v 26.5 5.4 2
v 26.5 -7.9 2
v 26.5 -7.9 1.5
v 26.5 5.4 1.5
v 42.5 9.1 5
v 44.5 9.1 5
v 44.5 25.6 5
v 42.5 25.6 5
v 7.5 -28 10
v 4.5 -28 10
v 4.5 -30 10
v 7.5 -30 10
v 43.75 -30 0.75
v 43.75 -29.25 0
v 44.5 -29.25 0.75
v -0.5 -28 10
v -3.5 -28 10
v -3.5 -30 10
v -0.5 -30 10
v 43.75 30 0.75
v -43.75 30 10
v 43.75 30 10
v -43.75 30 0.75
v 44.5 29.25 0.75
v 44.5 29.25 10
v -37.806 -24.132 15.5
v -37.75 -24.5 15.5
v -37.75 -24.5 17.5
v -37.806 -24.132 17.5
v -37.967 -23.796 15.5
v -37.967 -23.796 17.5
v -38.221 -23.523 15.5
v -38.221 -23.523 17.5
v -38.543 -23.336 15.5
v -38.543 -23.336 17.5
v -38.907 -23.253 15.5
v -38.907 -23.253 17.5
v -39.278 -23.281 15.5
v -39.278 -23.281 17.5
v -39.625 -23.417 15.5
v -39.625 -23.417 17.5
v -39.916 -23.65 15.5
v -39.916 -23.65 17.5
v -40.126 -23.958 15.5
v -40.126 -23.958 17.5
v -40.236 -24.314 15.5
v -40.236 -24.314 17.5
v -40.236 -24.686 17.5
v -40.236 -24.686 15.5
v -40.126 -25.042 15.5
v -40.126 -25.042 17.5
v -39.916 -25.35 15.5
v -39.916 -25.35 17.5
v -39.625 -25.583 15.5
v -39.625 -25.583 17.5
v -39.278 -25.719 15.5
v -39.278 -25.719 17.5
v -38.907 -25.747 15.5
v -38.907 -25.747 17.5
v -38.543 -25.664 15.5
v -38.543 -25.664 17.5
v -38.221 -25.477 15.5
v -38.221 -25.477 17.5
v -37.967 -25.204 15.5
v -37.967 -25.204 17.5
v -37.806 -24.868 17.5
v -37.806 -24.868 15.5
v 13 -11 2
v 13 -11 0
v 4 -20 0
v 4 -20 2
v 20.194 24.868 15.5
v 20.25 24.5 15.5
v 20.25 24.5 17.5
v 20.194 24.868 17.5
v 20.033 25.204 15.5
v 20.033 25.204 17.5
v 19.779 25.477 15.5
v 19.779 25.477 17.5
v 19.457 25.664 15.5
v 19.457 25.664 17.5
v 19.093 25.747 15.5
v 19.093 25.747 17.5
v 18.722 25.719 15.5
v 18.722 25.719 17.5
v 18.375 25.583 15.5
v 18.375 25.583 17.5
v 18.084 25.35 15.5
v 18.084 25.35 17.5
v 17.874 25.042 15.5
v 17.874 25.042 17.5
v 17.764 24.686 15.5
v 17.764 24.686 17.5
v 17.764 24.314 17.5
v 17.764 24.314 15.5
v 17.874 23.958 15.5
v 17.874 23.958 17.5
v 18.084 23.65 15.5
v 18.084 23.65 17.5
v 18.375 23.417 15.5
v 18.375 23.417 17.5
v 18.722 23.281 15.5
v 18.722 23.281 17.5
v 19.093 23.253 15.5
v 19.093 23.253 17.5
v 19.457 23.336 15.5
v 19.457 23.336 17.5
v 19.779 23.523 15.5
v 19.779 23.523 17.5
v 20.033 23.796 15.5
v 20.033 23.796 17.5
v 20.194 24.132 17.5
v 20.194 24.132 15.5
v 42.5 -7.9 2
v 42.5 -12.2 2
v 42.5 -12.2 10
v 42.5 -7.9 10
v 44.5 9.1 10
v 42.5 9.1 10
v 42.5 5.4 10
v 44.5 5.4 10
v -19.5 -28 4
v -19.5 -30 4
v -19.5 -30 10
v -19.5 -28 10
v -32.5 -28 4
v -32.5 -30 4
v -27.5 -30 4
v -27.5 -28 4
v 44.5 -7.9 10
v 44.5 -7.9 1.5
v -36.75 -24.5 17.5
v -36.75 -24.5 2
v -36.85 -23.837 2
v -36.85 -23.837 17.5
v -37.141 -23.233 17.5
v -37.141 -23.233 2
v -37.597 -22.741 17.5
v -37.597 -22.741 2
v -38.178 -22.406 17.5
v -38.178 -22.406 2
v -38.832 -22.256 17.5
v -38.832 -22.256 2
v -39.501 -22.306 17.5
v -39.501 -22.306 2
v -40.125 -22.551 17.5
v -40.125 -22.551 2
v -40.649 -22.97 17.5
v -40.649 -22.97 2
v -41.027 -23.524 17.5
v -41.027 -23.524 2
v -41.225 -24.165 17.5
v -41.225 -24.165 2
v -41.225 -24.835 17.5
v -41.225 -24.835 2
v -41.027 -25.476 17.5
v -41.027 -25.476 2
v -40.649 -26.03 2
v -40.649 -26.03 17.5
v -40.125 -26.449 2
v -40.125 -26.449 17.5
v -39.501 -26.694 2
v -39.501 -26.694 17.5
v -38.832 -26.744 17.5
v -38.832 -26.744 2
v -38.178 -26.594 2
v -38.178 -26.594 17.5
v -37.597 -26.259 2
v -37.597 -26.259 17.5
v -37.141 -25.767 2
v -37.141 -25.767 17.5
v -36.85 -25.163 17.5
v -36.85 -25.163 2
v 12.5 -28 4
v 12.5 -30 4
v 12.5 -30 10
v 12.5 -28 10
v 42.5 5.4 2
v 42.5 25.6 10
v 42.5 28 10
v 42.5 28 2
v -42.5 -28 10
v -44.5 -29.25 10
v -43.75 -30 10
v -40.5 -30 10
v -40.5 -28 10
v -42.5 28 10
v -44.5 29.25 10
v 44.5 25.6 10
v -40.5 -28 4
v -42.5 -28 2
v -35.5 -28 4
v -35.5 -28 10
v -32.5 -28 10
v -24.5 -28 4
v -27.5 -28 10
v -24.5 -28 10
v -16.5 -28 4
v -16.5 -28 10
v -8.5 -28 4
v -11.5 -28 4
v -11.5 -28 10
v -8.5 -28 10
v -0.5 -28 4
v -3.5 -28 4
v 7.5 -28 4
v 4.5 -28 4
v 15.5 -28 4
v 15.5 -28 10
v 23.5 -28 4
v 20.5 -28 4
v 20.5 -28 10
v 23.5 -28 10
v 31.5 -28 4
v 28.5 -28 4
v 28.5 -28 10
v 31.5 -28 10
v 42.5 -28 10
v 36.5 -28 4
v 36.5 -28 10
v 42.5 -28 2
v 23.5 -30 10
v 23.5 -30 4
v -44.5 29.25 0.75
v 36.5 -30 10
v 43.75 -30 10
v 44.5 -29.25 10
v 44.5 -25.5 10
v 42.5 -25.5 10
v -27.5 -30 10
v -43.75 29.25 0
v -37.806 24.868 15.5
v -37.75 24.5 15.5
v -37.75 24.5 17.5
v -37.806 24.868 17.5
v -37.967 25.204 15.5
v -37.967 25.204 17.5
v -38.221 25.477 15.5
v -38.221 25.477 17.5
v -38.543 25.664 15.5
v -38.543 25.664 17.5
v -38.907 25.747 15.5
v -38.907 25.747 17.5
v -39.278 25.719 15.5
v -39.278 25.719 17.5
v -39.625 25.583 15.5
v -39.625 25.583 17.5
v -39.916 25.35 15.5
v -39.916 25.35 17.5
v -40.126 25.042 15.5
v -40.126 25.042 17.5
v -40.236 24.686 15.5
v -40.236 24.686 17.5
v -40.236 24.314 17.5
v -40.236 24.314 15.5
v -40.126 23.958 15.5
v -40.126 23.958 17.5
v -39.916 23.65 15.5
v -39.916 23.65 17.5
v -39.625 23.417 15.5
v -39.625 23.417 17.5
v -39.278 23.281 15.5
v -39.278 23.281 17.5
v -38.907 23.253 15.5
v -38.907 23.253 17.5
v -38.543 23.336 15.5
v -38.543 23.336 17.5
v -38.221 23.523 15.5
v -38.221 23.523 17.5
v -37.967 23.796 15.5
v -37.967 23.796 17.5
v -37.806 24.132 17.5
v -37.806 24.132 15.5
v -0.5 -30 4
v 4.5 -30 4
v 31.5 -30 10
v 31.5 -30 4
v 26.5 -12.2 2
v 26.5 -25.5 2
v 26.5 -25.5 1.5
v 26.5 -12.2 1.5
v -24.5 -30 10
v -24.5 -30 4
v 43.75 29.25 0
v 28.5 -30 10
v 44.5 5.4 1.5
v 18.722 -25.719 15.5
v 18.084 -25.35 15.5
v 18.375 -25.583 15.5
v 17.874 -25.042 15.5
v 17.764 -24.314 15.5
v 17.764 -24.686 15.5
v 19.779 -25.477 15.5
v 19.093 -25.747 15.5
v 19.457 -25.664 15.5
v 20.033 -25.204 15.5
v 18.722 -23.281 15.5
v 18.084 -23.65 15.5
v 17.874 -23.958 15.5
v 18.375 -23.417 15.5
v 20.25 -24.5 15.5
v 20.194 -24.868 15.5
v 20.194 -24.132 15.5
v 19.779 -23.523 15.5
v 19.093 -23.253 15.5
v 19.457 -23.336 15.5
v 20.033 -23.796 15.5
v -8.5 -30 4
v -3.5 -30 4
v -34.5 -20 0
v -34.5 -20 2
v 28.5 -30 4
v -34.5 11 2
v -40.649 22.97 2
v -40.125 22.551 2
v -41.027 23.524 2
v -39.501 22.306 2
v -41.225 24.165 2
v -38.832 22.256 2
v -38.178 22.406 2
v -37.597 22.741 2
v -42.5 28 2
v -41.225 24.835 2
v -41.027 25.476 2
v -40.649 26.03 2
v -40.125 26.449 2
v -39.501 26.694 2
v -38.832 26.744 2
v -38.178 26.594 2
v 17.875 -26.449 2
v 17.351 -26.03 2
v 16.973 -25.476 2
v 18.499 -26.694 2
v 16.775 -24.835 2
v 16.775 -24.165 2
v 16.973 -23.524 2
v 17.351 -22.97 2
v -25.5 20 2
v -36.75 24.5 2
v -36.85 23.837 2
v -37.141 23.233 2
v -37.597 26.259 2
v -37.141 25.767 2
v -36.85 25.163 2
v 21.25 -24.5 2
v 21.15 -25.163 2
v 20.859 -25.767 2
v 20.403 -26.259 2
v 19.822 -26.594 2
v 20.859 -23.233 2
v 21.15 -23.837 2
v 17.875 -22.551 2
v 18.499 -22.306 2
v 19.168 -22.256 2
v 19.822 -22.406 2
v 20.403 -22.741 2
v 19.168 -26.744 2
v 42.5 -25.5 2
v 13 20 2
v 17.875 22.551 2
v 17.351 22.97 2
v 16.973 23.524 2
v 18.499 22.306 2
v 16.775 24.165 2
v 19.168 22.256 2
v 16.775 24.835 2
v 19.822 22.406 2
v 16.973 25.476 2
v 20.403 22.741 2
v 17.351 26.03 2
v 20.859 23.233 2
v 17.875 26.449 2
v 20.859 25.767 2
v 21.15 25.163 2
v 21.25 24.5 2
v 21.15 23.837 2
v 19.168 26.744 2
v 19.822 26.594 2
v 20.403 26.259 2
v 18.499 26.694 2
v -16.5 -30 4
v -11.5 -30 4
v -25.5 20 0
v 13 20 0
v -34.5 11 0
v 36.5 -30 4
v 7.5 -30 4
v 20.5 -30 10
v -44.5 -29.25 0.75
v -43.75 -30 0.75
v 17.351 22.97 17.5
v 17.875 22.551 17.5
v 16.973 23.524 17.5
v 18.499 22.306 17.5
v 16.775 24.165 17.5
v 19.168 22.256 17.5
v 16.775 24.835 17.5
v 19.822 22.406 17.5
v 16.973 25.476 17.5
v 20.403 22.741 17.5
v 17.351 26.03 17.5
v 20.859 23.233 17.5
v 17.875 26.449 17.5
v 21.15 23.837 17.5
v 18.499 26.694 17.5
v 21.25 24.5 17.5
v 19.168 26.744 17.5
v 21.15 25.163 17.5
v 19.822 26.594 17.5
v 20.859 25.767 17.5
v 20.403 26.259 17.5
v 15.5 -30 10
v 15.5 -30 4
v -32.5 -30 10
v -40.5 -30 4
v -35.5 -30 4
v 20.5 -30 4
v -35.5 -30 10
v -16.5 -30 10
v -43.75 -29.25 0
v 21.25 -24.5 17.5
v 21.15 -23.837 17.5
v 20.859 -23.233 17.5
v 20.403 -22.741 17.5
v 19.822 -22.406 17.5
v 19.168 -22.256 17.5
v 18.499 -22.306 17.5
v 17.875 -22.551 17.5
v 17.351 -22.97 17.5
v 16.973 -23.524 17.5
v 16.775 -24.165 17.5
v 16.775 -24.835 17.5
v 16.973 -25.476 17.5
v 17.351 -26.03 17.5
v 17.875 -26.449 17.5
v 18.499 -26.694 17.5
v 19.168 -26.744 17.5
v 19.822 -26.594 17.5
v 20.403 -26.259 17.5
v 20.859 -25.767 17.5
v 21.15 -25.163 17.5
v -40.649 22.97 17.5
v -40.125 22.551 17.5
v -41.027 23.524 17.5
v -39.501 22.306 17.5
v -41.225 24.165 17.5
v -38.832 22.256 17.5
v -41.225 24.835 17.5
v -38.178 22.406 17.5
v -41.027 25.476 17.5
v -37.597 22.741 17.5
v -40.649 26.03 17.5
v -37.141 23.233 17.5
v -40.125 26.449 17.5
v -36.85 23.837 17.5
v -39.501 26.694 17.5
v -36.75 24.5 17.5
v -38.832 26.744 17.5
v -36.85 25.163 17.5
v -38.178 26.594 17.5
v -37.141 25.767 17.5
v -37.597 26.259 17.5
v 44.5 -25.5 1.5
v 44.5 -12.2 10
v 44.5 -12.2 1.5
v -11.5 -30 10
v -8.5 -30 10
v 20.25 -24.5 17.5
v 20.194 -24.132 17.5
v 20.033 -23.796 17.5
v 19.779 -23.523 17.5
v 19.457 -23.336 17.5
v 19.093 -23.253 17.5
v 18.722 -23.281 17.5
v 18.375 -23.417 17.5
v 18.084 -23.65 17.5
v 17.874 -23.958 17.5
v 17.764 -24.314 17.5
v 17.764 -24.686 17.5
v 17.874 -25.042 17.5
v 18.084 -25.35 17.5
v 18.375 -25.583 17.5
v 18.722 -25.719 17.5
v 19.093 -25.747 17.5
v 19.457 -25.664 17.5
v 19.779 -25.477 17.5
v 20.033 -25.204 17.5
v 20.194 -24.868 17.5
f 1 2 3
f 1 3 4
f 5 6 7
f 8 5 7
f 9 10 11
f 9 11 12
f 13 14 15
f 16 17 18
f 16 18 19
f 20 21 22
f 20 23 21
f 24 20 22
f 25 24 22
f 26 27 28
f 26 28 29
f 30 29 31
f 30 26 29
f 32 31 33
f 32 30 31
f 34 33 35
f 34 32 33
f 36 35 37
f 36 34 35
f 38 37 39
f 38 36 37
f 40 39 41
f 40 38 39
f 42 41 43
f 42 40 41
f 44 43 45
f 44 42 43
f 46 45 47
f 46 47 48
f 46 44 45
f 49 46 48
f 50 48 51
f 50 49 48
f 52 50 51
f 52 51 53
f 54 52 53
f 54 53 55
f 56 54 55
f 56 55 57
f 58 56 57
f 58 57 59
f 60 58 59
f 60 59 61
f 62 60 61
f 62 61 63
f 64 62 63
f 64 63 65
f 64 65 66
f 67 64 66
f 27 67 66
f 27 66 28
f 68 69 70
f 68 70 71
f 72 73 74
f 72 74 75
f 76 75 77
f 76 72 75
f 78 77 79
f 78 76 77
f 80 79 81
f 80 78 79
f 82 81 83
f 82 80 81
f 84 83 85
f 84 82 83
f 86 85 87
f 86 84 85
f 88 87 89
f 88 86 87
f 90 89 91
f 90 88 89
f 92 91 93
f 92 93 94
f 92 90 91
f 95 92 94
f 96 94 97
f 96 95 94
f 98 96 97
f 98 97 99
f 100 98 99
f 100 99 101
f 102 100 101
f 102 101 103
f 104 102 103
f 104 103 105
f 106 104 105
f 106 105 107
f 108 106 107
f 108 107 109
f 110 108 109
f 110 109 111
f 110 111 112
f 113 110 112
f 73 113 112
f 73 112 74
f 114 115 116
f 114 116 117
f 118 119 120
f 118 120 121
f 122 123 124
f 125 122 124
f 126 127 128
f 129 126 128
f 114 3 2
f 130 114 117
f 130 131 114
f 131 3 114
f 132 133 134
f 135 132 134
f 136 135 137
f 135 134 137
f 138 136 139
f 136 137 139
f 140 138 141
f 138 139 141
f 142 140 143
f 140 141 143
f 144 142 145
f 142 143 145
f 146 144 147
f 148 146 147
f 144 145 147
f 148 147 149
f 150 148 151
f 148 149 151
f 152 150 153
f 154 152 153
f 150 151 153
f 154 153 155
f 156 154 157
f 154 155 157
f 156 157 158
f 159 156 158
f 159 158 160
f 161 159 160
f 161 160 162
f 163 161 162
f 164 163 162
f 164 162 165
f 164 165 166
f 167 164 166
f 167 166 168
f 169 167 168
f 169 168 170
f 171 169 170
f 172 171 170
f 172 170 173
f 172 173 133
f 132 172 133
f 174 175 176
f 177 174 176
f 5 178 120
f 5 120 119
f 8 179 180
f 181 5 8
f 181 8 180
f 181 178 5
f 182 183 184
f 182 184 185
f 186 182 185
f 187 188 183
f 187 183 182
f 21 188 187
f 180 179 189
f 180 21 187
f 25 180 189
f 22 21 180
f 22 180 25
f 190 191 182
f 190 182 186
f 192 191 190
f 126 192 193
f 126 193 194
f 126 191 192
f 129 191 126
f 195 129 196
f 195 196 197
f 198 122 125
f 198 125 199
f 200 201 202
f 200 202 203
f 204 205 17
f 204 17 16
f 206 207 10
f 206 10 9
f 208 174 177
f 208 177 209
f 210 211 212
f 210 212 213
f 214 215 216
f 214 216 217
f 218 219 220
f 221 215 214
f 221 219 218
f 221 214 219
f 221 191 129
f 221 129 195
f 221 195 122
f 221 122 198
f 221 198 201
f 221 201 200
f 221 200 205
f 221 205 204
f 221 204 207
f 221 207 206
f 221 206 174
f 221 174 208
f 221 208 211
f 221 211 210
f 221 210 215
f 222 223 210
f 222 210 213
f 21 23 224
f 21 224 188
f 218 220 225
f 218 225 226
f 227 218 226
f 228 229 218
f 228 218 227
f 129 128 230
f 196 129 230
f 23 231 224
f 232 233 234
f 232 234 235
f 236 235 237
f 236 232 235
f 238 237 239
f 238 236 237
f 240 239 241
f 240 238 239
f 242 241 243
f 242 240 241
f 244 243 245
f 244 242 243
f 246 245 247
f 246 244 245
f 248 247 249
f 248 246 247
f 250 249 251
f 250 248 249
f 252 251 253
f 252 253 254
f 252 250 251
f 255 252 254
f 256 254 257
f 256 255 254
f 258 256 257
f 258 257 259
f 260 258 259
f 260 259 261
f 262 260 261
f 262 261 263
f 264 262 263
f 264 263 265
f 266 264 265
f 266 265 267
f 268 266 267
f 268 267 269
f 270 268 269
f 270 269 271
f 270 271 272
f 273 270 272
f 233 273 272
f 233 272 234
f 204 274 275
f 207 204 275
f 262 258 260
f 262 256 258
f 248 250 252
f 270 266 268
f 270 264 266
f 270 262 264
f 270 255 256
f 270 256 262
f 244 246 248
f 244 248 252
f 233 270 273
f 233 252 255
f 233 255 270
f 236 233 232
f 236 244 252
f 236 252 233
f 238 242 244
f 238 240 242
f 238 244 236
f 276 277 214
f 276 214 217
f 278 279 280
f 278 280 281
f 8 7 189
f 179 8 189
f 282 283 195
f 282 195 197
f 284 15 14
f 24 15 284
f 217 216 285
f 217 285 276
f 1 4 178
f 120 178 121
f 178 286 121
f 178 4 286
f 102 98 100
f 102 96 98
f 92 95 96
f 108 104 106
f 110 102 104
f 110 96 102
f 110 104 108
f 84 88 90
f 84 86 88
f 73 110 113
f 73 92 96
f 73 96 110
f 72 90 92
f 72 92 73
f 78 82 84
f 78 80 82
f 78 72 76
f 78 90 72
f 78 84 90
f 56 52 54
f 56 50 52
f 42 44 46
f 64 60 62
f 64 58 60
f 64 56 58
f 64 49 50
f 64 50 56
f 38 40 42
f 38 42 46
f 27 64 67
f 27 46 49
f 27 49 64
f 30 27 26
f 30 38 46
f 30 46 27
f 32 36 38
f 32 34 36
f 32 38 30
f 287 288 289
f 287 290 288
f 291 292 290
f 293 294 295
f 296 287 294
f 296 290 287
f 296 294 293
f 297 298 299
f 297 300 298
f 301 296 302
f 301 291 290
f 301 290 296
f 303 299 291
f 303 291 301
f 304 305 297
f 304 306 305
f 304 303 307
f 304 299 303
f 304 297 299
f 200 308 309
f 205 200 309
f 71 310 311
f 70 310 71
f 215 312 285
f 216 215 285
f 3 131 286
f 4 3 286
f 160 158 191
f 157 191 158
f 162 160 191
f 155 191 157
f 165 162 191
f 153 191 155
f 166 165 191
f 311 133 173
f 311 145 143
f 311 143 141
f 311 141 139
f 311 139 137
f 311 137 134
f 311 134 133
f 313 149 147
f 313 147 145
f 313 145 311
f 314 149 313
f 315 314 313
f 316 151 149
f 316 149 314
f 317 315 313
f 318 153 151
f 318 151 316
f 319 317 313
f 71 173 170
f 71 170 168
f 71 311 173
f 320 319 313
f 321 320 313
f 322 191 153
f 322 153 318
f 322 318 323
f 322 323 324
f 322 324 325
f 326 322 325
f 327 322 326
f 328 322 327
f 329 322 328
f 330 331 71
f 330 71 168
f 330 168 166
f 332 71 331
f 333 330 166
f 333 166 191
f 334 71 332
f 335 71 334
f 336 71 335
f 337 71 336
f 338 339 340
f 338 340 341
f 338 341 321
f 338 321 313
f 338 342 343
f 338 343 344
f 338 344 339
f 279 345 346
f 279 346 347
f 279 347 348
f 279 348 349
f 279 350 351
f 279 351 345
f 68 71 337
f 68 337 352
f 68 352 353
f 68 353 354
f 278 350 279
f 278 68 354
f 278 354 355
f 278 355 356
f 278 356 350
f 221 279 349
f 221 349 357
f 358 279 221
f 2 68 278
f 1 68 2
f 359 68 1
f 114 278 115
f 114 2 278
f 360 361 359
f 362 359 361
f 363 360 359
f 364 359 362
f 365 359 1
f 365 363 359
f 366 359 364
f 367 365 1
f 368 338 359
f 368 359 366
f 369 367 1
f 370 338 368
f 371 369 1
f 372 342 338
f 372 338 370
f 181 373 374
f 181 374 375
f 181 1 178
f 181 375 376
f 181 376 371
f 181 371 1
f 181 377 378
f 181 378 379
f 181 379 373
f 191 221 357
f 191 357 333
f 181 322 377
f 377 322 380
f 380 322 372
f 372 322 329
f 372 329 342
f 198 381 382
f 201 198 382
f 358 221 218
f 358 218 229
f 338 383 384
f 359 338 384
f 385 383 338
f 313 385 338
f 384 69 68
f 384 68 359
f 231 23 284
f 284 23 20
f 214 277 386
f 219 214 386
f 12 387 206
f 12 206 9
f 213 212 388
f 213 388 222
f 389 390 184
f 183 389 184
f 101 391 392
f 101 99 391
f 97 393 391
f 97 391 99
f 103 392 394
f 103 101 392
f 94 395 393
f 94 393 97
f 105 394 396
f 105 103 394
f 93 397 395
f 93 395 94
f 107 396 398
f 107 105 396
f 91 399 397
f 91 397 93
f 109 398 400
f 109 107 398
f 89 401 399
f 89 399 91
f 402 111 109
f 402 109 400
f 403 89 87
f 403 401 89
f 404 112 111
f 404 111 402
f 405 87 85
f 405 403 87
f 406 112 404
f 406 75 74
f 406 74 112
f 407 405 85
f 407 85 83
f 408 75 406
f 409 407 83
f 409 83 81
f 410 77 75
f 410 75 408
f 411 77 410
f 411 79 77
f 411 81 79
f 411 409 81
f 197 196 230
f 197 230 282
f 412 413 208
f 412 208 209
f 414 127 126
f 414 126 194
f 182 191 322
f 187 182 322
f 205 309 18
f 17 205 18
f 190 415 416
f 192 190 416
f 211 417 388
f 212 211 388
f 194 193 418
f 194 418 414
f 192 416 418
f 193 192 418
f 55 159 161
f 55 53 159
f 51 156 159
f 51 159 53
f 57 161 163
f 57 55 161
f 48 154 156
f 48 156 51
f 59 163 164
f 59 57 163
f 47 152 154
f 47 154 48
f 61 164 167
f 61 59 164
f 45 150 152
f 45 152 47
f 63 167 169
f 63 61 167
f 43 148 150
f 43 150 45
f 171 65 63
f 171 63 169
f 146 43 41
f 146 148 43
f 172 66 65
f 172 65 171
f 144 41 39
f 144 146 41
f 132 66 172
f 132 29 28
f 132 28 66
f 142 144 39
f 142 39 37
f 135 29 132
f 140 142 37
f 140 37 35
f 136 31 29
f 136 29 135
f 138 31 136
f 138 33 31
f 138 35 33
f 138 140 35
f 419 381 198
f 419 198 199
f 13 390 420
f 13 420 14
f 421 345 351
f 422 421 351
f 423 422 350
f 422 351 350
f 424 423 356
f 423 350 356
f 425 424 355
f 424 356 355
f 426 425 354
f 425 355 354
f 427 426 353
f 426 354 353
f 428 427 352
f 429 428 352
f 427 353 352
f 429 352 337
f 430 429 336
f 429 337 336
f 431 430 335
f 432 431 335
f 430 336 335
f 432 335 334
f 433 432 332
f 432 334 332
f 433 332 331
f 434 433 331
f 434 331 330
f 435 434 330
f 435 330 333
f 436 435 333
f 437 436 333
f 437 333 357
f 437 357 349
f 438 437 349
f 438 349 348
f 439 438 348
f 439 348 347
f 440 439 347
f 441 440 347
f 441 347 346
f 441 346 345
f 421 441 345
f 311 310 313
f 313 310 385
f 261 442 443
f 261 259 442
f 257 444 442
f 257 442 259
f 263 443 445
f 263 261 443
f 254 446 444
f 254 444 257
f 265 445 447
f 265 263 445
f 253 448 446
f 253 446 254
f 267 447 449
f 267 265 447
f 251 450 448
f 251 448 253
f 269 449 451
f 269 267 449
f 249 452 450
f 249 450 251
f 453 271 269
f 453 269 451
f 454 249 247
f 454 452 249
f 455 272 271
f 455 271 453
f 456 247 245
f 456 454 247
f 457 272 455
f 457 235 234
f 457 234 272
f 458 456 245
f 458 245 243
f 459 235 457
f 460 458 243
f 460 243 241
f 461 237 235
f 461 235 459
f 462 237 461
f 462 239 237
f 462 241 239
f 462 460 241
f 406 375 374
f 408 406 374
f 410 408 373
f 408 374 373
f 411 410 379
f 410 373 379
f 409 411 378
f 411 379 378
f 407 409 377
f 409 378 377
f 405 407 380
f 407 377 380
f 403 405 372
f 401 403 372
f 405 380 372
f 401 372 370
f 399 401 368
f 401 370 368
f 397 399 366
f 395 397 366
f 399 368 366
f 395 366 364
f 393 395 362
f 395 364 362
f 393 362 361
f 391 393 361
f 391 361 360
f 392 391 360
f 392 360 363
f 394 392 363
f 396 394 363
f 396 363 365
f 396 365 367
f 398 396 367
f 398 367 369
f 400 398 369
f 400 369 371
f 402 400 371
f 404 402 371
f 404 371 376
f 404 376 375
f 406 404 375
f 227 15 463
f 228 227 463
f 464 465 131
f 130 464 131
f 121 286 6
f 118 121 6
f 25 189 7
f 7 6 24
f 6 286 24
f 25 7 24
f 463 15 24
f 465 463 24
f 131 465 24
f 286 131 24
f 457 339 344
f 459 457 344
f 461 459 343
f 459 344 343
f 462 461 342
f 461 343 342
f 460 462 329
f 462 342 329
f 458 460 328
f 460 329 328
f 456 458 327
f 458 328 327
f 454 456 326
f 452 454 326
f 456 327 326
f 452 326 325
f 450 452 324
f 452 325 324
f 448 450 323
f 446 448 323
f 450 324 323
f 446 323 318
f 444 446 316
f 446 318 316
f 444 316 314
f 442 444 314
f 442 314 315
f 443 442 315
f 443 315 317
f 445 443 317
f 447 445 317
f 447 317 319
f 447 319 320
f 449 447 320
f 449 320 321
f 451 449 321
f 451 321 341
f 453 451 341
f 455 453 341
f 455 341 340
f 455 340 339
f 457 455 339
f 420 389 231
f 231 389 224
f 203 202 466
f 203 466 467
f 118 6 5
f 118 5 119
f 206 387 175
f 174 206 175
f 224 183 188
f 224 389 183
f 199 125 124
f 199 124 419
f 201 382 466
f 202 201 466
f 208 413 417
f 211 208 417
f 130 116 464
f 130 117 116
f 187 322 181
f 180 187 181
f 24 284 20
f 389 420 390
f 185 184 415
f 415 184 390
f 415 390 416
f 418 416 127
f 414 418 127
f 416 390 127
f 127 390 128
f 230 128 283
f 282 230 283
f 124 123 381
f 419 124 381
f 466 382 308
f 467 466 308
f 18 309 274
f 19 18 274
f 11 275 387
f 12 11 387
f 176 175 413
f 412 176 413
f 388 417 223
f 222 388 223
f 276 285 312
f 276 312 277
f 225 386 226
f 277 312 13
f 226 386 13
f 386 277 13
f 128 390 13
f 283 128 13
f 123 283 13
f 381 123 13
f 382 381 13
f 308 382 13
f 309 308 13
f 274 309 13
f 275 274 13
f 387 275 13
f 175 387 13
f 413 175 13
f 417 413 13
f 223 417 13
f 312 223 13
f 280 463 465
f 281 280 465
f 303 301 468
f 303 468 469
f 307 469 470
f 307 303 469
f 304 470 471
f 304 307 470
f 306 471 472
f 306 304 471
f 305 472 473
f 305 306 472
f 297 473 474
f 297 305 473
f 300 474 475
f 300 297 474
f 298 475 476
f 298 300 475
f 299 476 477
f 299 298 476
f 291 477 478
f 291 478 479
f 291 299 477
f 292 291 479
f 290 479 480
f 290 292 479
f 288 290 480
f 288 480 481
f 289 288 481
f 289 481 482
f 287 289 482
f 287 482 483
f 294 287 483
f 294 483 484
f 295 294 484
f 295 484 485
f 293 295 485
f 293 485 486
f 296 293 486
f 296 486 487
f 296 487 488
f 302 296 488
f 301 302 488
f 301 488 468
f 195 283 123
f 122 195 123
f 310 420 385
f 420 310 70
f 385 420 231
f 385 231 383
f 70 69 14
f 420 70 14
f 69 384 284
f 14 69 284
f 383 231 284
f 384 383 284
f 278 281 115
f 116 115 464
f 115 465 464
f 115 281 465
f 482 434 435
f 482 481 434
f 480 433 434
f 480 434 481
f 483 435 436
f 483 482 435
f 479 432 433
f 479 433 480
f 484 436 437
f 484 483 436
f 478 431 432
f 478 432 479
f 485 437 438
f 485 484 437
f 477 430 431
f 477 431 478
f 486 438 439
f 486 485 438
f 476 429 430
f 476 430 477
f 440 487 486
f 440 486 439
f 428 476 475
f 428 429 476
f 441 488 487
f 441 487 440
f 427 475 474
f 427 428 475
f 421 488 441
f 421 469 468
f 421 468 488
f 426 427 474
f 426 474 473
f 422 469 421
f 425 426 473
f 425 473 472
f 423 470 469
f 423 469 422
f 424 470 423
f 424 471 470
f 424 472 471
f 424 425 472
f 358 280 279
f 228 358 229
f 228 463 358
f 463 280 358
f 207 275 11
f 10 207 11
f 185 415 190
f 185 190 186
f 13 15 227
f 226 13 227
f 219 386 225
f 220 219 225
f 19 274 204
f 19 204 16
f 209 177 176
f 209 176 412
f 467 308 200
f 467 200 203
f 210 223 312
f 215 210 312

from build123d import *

# Parameters (mm, degrees)
F0_W      = 89
F0_H      = 60
F0_W_2    = 85
F0_H_2    = 56
F1_DEPTH  = 10
F2_DEPTH  = 2
F3_W      = 13.3
F3_H      = 8.5
F3_W_2    = 16.5
F3_H_2    = 5
F4_DEPTH  = 18
F5_SIZE   = 0.75
F6_R      = 2.25
F6_R_2    = 1.25
F7_DEPTH  = 17.5
F8_DEPTH  = 13.5
F9_W      = 47.5
F9_H      = 40
F10_DEPTH = 25
F11_SIZE  = 9
F12_W     = 5
F12_H     = 6
F13_DEPTH = 2


with BuildPart() as f1:
    # F0 (on Top) → F1 (new body)
    with BuildSketch(Plane.XY):
        Rectangle(F0_W, F0_H)
        Rectangle(F0_W_2, F0_H_2, mode=Mode.SUBTRACT)
    extrude(amount=F1_DEPTH)

    # F0 (on Top) → F2 (join)
    with BuildSketch(Plane.XY):
        Rectangle(F0_W_2, F0_H_2)
    extrude(amount=F2_DEPTH)

    # F3 (on face) → F4 (cut)
    with BuildSketch(Plane.YZ.offset(44.5)):
        with Locations((-18.85, 5.75)):
            Rectangle(F3_W, F3_H)
        with Locations((-1.25, 5.75)):
            Rectangle(F3_W, F3_H)
        with Locations((17.35, 7.5)):
            Rectangle(F3_W_2, F3_H_2)
    extrude(amount=-F4_DEPTH, mode=Mode.SUBTRACT)

    # F5
    f5_edges = [f1.edges().sort_by_distance(p)[0] for p in [
        (44.5, 0, 0),
        (0, 30, 0),
        (-44.5, 0, 0),
        (0, -30, 0),
        (44.5, -30, 5),
        (-44.5, -30, 5),
        (-44.5, 30, 5),
        (44.5, 30, 5),
    ]]
    chamfer(f5_edges, length=F5_SIZE)

    # F6 (on face) → F7 (join)
    with BuildSketch(Plane.XY):
        with Locations((-39, -24.5)):
            Circle(F6_R)
        with Locations((-39, -24.5)):
            Circle(F6_R_2, mode=Mode.SUBTRACT)
        with Locations((19, -24.5)):
            Circle(F6_R)
        with Locations((19, -24.5)):
            Circle(F6_R_2, mode=Mode.SUBTRACT)
        with Locations((19, 24.5)):
            Circle(F6_R)
        with Locations((19, 24.5)):
            Circle(F6_R_2, mode=Mode.SUBTRACT)
        with Locations((-39, 24.5)):
            Circle(F6_R)
        with Locations((-39, 24.5)):
            Circle(F6_R_2, mode=Mode.SUBTRACT)
    extrude(amount=F7_DEPTH)

    # F8 (add): faces of the model
    f8_faces = [f1.faces().sort_by_distance(p)[0] for p in [
        (-39, 24.5, 2),
        (-39, -24.5, 2),
        (19, 24.5, 2),
        (19, -24.5, 2),
    ]]
    extrude(f8_faces, amount=F8_DEPTH)

    # F9 (on face) → F10 (cut)
    with BuildSketch(Plane.XY):
        with Locations((-10.75, 0)):
            Rectangle(F9_W, F9_H)
    extrude(amount=F10_DEPTH, mode=Mode.SUBTRACT)

    # F11
    f11_edges = [f1.edges().sort_by_distance(p)[0] for p in [
        (13, -20, 1),
        (-34.5, 20, 1),
    ]]
    chamfer(f11_edges, length=F11_SIZE)

    # F12 (on face) → F13 (cut)
    with BuildSketch(Plane.XZ.offset(30)):
        with Locations((34, 7)):
            Rectangle(F12_W, F12_H)
        with Locations((26, 7)):
            Rectangle(F12_W, F12_H)
        with Locations((18, 7)):
            Rectangle(F12_W, F12_H)
        with Locations((10, 7)):
            Rectangle(F12_W, F12_H)
        with Locations((2, 7)):
            Rectangle(F12_W, F12_H)
        with Locations((-6, 7)):
            Rectangle(F12_W, F12_H)
        with Locations((-14, 7)):
            Rectangle(F12_W, F12_H)
        with Locations((-22, 7)):
            Rectangle(F12_W, F12_H)
        with Locations((-30, 7)):
            Rectangle(F12_W, F12_H)
        with Locations((-38, 7)):
            Rectangle(F12_W, F12_H)
    extrude(amount=-F13_DEPTH, mode=Mode.SUBTRACT)


solid = f1.part
